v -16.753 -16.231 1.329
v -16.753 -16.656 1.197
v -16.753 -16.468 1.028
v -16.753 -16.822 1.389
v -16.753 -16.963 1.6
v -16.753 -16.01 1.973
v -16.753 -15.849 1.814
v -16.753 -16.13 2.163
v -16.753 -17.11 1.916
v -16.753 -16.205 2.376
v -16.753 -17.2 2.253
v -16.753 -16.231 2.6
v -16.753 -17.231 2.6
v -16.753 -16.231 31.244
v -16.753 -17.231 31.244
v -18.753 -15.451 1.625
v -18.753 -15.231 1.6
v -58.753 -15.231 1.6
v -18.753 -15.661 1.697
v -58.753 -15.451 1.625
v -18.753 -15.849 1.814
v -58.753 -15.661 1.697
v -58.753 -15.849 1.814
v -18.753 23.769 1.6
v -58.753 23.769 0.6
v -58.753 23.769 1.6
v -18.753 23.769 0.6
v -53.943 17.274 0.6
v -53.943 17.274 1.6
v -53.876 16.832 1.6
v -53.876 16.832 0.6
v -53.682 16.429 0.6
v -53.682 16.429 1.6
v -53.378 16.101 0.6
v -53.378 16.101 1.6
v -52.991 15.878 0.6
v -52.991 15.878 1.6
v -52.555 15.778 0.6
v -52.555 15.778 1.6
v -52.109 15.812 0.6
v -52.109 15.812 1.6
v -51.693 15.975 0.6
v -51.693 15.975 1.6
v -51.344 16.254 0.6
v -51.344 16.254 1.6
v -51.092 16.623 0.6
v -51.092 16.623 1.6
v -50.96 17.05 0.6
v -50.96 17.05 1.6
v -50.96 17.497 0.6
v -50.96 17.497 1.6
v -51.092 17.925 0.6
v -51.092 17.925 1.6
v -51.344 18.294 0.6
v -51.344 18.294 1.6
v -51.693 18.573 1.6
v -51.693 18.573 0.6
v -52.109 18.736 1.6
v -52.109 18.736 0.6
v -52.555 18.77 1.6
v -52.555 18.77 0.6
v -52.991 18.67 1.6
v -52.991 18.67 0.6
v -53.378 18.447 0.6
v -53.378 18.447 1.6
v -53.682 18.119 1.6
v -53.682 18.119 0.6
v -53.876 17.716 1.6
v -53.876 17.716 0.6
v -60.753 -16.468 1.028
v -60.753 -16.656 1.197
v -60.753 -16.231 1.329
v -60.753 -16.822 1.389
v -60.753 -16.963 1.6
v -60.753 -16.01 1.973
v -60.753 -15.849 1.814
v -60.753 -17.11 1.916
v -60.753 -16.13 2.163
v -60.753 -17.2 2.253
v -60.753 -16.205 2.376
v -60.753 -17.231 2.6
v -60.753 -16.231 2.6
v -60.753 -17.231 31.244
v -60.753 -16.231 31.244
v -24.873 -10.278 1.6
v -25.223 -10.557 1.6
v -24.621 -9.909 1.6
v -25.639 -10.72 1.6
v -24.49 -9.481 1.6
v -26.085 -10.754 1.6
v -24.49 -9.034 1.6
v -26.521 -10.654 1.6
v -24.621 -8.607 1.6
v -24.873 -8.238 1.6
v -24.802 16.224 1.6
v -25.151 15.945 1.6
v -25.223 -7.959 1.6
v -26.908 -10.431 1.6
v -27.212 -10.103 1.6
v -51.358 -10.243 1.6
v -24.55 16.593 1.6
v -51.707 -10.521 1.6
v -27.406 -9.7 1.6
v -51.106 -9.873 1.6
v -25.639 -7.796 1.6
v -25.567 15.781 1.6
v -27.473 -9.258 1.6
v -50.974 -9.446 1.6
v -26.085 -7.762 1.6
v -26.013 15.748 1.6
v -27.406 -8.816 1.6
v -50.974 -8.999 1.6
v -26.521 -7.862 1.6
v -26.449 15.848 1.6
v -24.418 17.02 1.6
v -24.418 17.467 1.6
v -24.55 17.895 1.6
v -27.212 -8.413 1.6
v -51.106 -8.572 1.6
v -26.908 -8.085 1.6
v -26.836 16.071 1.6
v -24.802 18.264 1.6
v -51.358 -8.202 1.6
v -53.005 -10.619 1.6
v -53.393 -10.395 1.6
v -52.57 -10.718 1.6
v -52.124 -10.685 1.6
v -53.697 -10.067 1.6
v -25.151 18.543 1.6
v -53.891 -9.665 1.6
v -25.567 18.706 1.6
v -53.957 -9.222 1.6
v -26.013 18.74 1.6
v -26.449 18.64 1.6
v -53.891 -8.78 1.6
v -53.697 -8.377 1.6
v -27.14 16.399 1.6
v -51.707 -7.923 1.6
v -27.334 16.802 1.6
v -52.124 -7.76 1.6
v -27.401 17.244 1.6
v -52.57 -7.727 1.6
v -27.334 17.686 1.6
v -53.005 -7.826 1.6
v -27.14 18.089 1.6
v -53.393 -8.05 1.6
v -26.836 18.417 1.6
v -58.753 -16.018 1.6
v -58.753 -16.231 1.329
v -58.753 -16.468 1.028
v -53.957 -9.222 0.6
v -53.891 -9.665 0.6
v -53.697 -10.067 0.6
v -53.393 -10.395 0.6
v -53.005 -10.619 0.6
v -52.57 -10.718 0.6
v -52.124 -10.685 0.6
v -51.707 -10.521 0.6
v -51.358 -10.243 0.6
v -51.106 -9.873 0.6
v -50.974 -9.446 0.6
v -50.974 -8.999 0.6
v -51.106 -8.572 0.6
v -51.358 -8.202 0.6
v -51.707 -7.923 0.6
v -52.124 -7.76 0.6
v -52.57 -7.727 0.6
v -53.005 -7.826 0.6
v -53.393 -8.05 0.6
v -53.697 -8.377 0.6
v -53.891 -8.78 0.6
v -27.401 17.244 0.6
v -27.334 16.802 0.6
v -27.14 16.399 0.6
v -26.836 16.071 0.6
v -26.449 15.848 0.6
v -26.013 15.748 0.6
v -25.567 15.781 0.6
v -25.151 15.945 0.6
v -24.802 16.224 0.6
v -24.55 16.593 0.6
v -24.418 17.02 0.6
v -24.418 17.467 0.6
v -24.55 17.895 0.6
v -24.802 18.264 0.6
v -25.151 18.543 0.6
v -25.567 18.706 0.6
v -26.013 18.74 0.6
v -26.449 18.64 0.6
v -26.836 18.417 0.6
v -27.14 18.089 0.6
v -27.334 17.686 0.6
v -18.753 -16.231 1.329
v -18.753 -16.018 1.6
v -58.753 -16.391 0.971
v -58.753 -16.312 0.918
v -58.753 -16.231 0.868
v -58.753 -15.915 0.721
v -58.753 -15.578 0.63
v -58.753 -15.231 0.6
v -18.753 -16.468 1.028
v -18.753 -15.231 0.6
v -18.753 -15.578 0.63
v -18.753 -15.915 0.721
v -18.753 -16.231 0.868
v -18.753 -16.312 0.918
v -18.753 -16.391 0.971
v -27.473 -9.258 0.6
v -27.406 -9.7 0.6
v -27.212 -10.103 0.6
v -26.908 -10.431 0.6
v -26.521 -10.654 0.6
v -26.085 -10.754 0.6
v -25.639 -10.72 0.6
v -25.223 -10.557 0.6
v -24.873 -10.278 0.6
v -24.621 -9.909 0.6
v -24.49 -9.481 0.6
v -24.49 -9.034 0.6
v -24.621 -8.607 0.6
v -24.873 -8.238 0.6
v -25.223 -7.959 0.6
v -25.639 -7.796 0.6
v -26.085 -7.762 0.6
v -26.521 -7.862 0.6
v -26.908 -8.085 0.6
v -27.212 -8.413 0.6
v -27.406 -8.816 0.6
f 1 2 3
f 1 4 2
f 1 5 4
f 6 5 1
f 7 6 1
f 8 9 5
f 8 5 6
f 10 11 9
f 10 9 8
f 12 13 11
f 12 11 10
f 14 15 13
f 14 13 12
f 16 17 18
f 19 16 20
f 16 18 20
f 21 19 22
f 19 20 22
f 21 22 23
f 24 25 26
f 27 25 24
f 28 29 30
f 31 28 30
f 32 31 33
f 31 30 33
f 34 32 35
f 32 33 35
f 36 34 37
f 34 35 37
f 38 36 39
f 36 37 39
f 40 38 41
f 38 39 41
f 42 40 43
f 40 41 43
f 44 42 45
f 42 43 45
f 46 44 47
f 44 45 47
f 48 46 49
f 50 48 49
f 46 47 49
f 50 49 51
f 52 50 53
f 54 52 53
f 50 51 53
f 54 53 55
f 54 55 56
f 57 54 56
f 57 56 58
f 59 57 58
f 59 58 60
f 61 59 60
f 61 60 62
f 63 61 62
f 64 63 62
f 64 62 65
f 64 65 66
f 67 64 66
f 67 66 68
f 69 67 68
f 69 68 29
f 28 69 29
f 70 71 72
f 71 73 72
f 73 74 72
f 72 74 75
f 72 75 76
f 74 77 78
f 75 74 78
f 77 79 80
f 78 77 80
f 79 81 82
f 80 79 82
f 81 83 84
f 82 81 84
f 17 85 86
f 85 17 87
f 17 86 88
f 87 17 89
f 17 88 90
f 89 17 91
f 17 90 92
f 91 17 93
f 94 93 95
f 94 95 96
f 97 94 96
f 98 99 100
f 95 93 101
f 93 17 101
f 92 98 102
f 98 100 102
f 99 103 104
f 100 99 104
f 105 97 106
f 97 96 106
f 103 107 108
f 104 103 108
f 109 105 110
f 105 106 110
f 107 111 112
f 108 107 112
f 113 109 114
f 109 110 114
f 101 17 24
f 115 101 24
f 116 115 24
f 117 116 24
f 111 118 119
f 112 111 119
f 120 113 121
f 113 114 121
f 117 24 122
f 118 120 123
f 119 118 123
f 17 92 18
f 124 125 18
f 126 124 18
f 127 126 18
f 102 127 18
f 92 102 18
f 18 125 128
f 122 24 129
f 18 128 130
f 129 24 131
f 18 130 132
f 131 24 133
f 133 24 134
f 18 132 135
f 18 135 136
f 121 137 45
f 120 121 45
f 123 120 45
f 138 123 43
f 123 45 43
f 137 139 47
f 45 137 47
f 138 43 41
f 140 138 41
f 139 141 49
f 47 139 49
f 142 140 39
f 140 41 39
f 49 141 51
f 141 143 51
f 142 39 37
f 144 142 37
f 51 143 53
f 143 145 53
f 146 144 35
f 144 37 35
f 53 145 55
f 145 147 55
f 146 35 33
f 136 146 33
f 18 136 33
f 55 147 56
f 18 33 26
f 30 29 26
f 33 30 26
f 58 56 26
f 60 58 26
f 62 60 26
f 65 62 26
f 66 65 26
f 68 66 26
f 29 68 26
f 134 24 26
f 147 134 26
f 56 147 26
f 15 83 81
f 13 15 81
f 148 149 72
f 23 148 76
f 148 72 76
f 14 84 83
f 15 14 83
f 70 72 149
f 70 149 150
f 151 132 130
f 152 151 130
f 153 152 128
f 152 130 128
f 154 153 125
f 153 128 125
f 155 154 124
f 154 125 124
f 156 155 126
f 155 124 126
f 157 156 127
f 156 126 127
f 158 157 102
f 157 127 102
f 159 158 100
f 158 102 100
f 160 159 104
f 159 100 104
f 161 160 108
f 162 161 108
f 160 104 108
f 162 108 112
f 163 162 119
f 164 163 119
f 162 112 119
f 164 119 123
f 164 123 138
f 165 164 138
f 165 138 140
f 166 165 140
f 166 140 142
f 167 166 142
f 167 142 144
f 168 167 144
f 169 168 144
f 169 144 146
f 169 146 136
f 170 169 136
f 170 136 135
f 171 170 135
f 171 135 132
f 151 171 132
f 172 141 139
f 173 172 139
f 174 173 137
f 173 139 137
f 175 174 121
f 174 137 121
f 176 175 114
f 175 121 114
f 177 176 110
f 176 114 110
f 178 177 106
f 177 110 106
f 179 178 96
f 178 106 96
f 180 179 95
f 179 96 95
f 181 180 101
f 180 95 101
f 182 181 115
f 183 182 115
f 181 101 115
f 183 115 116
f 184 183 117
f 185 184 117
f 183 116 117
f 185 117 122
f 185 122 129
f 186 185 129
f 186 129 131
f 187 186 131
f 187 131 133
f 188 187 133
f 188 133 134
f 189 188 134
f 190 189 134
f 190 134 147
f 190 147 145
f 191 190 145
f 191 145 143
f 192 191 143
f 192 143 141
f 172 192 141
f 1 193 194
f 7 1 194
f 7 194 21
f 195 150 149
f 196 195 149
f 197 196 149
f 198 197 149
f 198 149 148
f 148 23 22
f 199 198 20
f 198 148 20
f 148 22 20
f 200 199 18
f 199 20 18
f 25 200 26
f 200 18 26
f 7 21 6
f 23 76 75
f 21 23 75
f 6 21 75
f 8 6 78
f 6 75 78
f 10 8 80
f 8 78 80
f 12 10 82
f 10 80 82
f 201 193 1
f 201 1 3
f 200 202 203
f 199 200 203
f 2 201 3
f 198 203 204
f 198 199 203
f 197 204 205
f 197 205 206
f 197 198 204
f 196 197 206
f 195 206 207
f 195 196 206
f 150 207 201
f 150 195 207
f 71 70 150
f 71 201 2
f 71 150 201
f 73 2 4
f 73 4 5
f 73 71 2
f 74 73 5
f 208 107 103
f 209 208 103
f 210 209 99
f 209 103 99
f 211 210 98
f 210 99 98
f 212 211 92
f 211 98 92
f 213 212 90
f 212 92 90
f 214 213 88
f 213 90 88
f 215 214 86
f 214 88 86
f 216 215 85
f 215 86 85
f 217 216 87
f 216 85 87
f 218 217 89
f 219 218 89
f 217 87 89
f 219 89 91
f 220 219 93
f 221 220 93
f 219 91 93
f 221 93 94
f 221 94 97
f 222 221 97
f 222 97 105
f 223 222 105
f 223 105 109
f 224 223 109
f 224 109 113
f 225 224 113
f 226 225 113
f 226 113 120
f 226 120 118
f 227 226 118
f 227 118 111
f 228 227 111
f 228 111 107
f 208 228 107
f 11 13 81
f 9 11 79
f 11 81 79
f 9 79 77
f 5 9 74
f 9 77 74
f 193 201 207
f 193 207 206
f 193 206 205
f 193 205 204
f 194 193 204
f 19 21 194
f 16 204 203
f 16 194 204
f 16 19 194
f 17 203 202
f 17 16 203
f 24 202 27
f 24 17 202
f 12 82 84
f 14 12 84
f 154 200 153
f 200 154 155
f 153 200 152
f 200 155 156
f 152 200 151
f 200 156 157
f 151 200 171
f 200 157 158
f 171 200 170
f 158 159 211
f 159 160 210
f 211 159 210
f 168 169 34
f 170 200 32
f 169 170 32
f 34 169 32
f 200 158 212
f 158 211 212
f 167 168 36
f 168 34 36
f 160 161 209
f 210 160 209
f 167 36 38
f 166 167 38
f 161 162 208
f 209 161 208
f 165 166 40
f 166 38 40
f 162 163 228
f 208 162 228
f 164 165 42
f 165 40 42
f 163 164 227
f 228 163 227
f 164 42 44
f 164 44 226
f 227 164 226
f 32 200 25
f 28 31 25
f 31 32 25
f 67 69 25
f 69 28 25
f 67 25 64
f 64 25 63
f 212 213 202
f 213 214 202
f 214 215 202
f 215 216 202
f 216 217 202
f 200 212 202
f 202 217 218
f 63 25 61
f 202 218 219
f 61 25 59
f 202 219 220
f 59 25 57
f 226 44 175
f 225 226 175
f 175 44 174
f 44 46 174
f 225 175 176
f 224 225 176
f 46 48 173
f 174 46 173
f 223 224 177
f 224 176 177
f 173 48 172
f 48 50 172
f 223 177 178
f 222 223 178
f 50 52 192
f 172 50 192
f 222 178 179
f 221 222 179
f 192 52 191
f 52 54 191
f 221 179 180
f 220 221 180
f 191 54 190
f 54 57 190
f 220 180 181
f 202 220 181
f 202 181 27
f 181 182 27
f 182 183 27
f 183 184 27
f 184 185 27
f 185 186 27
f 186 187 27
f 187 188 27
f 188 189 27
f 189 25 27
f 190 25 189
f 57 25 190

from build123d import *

# Parameters (mm, degrees)
BOSS_EXTRUDE4_DEPTH    = 1.6
CONVERT_SOLID6_DEPTH   = 0.6
SKETCHED_START         = -60.753452496
SKETCHED_BEND3_DEPTH   = 44
SKETCHED_BEND3_2_DEPTH = 2
SKETCHED_START_2       = -18.753452496
SKETCHED_BEND3_3_DEPTH = 2
SKETCHED_BEND3_4_DEPTH = 44
SKETCHED_START_3       = -58.753452496
SKETCHED_BEND3_5_DEPTH = 40
F_3_0MM_DOWEL_HOLE1_D  = 3
F_3_0MM_DOWEL_HOLE2_D  = 3
F_3_0MM_DOWEL_HOLE3_D  = 3
F_3_0MM_DOWEL_HOLE4_D  = 3


# Read off the part's stored shape, not the designer's step: Convert-Solid6, Sketched Bend3
with BuildPart() as part:
    # Sketch1 → Boss-Extrude4 (new body)
    with BuildSketch(Plane.XY):
        Polygon((-58.753452496, 23.769203004), (-18.753452496, 23.769203004), (-18.753452496, -16.230796996), (-16.753452496, -16.230796996), (-16.753452496, -46.230796996), (-60.753452496, -46.230796996), (-60.753452496, -16.230796996), (-58.753452496, -16.230796996), align=None)
    extrude(amount=BOSS_EXTRUDE4_DEPTH)

    # Convert-Solid6 outline → Convert-Solid6 (cut)
    with BuildSketch(Plane.XY):
        Polygon((-58.753452496, 23.769203004), (-58.753452496, -16.230796996), (-60.753452496, -16.230796996), (-60.753452496, -46.230796996), (-16.753452496, -46.230796996), (-16.753452496, -16.230796996), (-18.753452496, -16.230796996), (-18.753452496, 23.769203004), align=None)
    extrude(amount=CONVERT_SOLID6_DEPTH, mode=Mode.SUBTRACT)

    # Sketched Bend3 outline → Sketched Bend3 (cut)
    with BuildSketch(Plane.YZ.offset(SKETCHED_START)):
        with BuildLine():
            Line((-16.962847803, 1.6), (-46.230796996, 1.6))
            Line((-46.230796996, 1.6), (-46.230796996, 0.6))
            Line((-46.230796996, 0.6), (-15.230796996, 0.6))
            ThreePointArc((-15.230796996, 0.6), (-16.230796996, 0.867949193), (-16.962847803, 1.6))
        make_face()
    extrude(amount=SKETCHED_BEND3_DEPTH, mode=Mode.SUBTRACT)

    # Sketched Bend3 2 outline → Sketched Bend3 2 (cut)
    with BuildSketch(Plane.YZ.offset(SKETCHED_START)):
        with BuildLine():
            Line((-16.230796996, 1.329098256), (-16.467536602, 1.028225479))
            ThreePointArc((-16.467536602, 1.028225479), (-16.35203432, 0.9438518), (-16.230796996, 0.867949193))
            Line((-16.230796996, 0.867949193), (-16.230796996, 1.329098256))
        make_face()
    extrude(amount=SKETCHED_BEND3_2_DEPTH, mode=Mode.SUBTRACT)

    # Sketched Bend3 3 outline → Sketched Bend3 3 (cut)
    with BuildSketch(Plane.YZ.offset(SKETCHED_START_2)):
        with BuildLine():
            Line((-16.230796996, 1.329098256), (-16.467536602, 1.028225479))
            ThreePointArc((-16.467536602, 1.028225479), (-16.35203432, 0.9438518), (-16.230796996, 0.867949193))
            Line((-16.230796996, 0.867949193), (-16.230796996, 1.329098256))
        make_face()
    extrude(amount=SKETCHED_BEND3_3_DEPTH, mode=Mode.SUBTRACT)

    # Sketched Bend3 4 outline → Sketched Bend3 4 (add)
    with BuildSketch(Plane.YZ.offset(SKETCHED_START)):
        with BuildLine():
            Line((-16.230796996, 31.24380551), (-17.230796996, 31.24380551))
            Line((-17.230796996, 31.24380551), (-17.230796996, 2.6))
            ThreePointArc((-17.230796996, 2.6), (-17.162648648, 2.08236191), (-16.962847803, 1.6))
            Line((-16.962847803, 1.6), (-16.230796996, 1.6))
            Line((-16.230796996, 1.6), (-16.230796996, 1.329098256))
            Line((-16.230796996, 1.329098256), (-15.849166799, 1.814112739))
            ThreePointArc((-15.849166799, 1.814112739), (-16.130344049, 2.163176124), (-16.230796996, 2.6))
            Line((-16.230796996, 2.6), (-16.230796996, 31.24380551))
        make_face()
    extrude(amount=SKETCHED_BEND3_4_DEPTH)

    # Sketched Bend3 5 outline → Sketched Bend3 5 (add)
    with BuildSketch(Plane.YZ.offset(SKETCHED_START_3)):
        with BuildLine():
            ThreePointArc((-15.230796996, 1.6), (-15.557991693, 1.655043054), (-15.849166799, 1.814112739))
            Line((-15.849166799, 1.814112739), (-16.017639885, 1.6))
            Line((-16.017639885, 1.6), (-15.230796996, 1.6))
        make_face()
    extrude(amount=SKETCHED_BEND3_5_DEPTH)

    # Ø3.0mm Dowel Hole1 (through all)
    with Locations(Plane(origin=(-8.856923846, -7.992050606, 0.6), x_dir=(1, 0, 0), z_dir=(0, 0, -1))):
        with Locations((-43.60055999, 1.230399912)):
            Hole(F_3_0MM_DOWEL_HOLE1_D / 2)

    # Ø3.0mm Dowel Hole2 (through all)
    with Locations(Plane(origin=(-8.856923846, -7.992050606, 0.6), x_dir=(1, 0, 0), z_dir=(0, 0, -1))):
        with Locations((-17.11602881, 1.265852801)):
            Hole(F_3_0MM_DOWEL_HOLE2_D / 2)

    # Ø3.0mm Dowel Hole3 (through all)
    with Locations(Plane(origin=(-8.856923846, -7.992050606, 0.6), x_dir=(1, 0, 0), z_dir=(0, 0, -1))):
        with Locations((-43.586196393, -25.265955548)):
            Hole(F_3_0MM_DOWEL_HOLE3_D / 2)

    # Ø3.0mm Dowel Hole4 (through all)
    with Locations(Plane(origin=(-8.856923846, -7.992050606, 0.6), x_dir=(1, 0, 0), z_dir=(0, 0, -1))):
        with Locations((-17.044209907, -25.235902464)):
            Hole(F_3_0MM_DOWEL_HOLE4_D / 2)


solid = part.part
